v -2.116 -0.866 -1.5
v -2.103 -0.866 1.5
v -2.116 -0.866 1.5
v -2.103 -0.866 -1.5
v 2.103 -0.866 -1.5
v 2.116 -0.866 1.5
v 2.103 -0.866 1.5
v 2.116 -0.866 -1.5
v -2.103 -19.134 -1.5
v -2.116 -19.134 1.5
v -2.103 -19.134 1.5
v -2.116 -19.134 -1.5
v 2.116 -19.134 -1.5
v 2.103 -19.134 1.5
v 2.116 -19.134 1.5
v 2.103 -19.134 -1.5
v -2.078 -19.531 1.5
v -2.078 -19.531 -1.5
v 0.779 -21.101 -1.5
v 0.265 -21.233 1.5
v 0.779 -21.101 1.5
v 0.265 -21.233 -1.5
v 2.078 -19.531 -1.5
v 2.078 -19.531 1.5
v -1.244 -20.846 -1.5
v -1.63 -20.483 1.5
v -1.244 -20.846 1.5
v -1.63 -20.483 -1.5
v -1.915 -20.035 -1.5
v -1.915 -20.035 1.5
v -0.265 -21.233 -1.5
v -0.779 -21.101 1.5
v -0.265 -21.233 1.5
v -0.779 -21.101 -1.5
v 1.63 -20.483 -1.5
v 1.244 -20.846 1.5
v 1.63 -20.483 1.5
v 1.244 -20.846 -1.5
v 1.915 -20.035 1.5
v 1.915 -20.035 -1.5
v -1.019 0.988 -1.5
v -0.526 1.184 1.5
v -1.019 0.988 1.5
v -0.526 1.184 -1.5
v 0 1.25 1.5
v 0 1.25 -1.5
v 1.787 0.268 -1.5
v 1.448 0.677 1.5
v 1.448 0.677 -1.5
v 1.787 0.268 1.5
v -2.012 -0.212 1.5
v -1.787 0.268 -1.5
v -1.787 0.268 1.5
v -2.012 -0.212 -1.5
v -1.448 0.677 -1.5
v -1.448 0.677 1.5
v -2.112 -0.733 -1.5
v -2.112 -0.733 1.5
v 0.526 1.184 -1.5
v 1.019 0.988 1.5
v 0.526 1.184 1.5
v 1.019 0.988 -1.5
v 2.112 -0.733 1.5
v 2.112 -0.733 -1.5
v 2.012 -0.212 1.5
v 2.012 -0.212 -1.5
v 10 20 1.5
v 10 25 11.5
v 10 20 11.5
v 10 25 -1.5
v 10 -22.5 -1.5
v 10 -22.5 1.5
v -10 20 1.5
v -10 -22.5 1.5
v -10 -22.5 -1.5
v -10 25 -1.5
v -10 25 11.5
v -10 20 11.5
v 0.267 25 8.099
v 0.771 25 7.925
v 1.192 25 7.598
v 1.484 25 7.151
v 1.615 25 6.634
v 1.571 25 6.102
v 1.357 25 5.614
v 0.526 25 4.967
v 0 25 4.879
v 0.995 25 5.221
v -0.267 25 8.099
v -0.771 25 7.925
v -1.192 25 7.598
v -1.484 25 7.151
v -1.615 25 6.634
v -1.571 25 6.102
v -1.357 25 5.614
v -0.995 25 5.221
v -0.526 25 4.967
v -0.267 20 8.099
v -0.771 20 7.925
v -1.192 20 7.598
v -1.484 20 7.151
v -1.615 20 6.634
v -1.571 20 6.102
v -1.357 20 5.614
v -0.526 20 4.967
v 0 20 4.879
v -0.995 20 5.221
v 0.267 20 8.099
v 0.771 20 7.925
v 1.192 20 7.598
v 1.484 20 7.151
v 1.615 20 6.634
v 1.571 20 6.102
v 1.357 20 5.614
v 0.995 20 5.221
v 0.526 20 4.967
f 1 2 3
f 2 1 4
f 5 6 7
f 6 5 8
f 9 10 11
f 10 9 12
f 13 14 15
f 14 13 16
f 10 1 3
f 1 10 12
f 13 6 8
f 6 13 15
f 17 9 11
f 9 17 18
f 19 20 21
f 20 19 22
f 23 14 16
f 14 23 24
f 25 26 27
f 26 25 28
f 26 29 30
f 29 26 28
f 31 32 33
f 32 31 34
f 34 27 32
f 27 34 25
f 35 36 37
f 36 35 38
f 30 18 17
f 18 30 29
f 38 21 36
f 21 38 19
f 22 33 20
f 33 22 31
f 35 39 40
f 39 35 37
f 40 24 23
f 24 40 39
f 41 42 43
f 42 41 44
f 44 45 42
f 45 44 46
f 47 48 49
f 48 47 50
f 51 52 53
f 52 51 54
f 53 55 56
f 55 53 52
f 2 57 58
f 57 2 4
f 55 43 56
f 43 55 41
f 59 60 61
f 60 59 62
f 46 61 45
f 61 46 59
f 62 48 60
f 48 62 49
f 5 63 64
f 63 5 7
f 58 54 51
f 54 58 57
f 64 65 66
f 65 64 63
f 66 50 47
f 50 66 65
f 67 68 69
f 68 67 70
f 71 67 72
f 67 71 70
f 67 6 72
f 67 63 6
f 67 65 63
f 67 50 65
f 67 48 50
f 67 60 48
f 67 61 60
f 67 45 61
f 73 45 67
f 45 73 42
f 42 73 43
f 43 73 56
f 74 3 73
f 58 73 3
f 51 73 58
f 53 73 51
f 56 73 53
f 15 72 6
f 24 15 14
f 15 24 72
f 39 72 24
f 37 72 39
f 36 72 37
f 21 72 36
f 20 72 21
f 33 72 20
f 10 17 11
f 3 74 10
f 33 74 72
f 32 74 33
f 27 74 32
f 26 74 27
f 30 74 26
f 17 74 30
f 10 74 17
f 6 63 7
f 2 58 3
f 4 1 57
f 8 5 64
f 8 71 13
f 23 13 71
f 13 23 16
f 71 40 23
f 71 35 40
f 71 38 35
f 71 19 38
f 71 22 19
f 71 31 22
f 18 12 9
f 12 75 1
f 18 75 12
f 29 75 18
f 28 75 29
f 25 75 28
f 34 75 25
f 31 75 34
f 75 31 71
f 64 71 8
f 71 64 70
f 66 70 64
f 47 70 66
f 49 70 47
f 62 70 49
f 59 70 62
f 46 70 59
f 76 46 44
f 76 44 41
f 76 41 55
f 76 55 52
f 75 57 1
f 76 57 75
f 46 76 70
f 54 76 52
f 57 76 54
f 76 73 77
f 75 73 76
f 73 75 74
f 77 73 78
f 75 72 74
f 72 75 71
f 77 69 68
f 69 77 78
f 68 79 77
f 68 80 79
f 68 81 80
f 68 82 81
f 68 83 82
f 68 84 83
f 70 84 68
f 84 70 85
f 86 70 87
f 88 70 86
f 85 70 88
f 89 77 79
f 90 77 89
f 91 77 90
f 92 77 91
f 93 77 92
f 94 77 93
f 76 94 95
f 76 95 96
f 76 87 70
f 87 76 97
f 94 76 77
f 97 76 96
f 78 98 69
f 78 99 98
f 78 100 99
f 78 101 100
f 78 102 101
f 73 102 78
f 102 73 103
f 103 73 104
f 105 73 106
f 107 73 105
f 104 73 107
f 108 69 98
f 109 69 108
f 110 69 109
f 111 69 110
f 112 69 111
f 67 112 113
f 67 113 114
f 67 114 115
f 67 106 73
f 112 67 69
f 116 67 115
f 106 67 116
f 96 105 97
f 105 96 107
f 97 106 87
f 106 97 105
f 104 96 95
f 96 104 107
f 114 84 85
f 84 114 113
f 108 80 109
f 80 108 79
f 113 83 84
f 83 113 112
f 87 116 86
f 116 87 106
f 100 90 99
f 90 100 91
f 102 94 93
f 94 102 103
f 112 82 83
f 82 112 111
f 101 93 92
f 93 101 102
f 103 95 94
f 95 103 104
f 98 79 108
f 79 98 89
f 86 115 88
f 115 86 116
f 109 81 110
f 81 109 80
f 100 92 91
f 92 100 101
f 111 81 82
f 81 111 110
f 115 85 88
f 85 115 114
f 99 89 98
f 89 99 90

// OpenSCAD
// file: bend.scad
// (c) 2011 Christopher "ScribbleJ" Jansen
//
// bend() module - creates a cube with a U or L shaped bend of the specified
// radius.

// d1 = length of first cube segment
// d2 = length of second cube segment
// r = (inner) radius of bend
// w = width of cube
// a = angle of bend.  0 = U, 180 = ---
// h = height of cube


module bend_demo()
{
  translate([-40*3,0,0])
  rotate([0,0,-90])
  for(i = [0:6])
    translate([0,40*i,0]) bend(a=(6-i)*30);
}

module bend(d1=10,d2=10,r=10,w=5,a=0,h=10)
{
  huge = r*w;
  difference()
  {
    cylinder(r=r+w, h=h);

    translate([0,0,-0.5])
    {
      cylinder(r=r, h=h+1);
      translate([0,r-huge,0]) cube([huge, huge, h+1]);
      rotate([0,0,-a]) translate([0,-r,0]) cube([huge, huge, h+1]);
    }
  }

  translate([0,0,-0.005])
  {
    translate([0,r,0]) cube([d1, w, h+0.01]);
    rotate([0,0,-a]) translate([0,-(r+w),0]) cube([d2, w, h+0.01]);
  }
}
// file: myLibs.scad
pi= 3.14159265359;

module hole(diam, height, clearance= 0.1)
{
        fn= round(diam * pi / 0.5);
        cylinder(h= height, r=diam / 2 / cos(180 / fn) + clearance, $fn=fn);
}

module nutTrap(ffd, faces=6, height=1)
{
	cylinder(h= height, r=ffd / cos(180 / faces) / 2 + 0.05, $fn=faces);
}

// A slot which has rounded ends, but total length is l
module slot(d= 4, l= 8, ht= 1, clearance=0.1) {
	fn= round(d * pi / 0.5);
	rd= d / 2 / cos(180 / fn) + clearance;
	d1= rd*2;
	union() {
		translate([0,0,ht/2]) cube([l-d1, d1, ht], center=true);
		translate([-(l-d1)/2, 0, ht/2]) cylinder(h=ht, r=rd, $fn=fn, center=true); 
		translate([(l-d1)/2, 0, ht/2]) cylinder(h=ht, r=rd, $fn=fn, center=true); 
	}
	
}

/**
 * Standard right-angled triangle
 *
 * @param number o_len Lenght of the opposite side
 * @param number a_len Lenght of the adjacent side
 * @param number depth How wide/deep the triangle is in the 3rd dimension
 * @todo a better way ?
 */
module triangle(o_len, a_len, depth)
{
    linear_extrude(height=depth)
    {
        polygon(points=[[0,0],[a_len,0],[0,o_len]], paths=[[0,1,2]]);
    }
}
// main file
// two parts one to hold the Hall-o endstopthe other to hold the magnet

use <myLibs.scad>
use <bend.scad>


mag_dia= 3;

magnet_holder_X();
//rotate([90, 0, 0])  endstop_holder();


module magnet_holder_X() {
	l= 35+10;
	w= 20;
	t= 3;
	lip= 10;
	union() {
	 	difference() {
	 		translate([0, 0, 0])  cube(size=[w, l, t], center=true);
	 		#translate([0,-10,-5]) rotate([0, 0, 90]) slot(d= 4, l= l/2, ht= 10);
	 	}
 		difference() {
	 		translate([0, l/2, lip/2])  cube(size=[w, 5, lip+t], center=true);
	 		#translate([0, 10-0.1, lip/2+t/2])  rotate([0, 90, 90]) hole(mag_dia, 20);
	 	}
	 }
}

module magnet_holder_Z() {
	l= 20;
	w= 20;
	union() {
	 	difference() {
	 		translate([0, 0, 0])  cube(size=[w, l, 5], center=true);
	 		#translate([0,0,-5]) rotate([0, 0, 90]) slot(d= 4, l= l-5, ht= 10);
	 	}
 		difference() {
	 		translate([0, l/2, 10/2 - 5/2])  cube(size=[w, 5, 10], center=true);
	 		#translate([0, 0, 5])  rotate([0, 90, 90]) hole(mag_dia, 20);
	 	}
	 }
}

module magnet_holder_Y() {
	ml1= 30;
	ml2= 10;
	mw= 5;
	mh= 15;
	fml= 25;
	union() {
	 	translate([0, -10/2, 0])  rotate([0, 0, -45])  difference() {
	 		translate([0, -10, 0])  bend(d1=ml1,d2=ml2,r=10,w=mw,a=90+45,h=mh);
	 		//#translate([fml/2, 10-1, mh/2]) rotate([90, 0, 0]) slot(d= 4, l= fml-10, ht= 10);
	 		#translate([2, 9, 5]) rotate([90, 0, 0]) cube([fml, 4, 10]);// slot(d= 4, l= fml-10, ht= 10);
	 	}
	 	translate([-ml2-2, 9+mw/2, 0]) {
	 		difference() {
	 			rotate([0, 0, 180-45]) bend(d1=15,d2=10,r=10,w=mw,a=90+45,h=mh);
	 			translate([-15, 0, mh/2])  rotate([90, 90, -45]) translate([0, 0, -10])  hole(mag_dia, 20);
	 		}
	 	}
	 }
	 echo(str("length= ", fml+30+(cos(45)*ml2)));
	 echo(str("drop= ", (sin(45)*(ml2+10))));
	 %rotate([0, 0, -45])  translate([-25, 0, 0])  cube(size=[30, 10, 10]);
	 %rotate([0, 0, 45])  translate([-10, 20, 0])  cube(size=[10, 10, 10]);
}
// hallo-holder, holds hallo horizontally witj bolt down to top of extrusion
esw= 13.64;
esl= 20;
est= 4;
esh= 10;
esbt= 1.55; // board thickness

module endstop_holder() {
	difference() {
		union() {
			cube(size=[esw+est*2, esl, esh], center=true);
			// flange
			translate([0, 0, -esh/2+2])  cube(size=[40, esl, 4], center=true);
		}
		translate([0, 0, 0])  cube(size=[esw, esl+1, 6], center=true);
		translate([0, 0, -2])  cube(size=[14.72, esl+1, esbt], center=true);
		#translate([-40/2+4, 0, -6])  hole(4, 6);
		#translate([40/2-4, 0, -6])  hole(4, 6);
	}
}
